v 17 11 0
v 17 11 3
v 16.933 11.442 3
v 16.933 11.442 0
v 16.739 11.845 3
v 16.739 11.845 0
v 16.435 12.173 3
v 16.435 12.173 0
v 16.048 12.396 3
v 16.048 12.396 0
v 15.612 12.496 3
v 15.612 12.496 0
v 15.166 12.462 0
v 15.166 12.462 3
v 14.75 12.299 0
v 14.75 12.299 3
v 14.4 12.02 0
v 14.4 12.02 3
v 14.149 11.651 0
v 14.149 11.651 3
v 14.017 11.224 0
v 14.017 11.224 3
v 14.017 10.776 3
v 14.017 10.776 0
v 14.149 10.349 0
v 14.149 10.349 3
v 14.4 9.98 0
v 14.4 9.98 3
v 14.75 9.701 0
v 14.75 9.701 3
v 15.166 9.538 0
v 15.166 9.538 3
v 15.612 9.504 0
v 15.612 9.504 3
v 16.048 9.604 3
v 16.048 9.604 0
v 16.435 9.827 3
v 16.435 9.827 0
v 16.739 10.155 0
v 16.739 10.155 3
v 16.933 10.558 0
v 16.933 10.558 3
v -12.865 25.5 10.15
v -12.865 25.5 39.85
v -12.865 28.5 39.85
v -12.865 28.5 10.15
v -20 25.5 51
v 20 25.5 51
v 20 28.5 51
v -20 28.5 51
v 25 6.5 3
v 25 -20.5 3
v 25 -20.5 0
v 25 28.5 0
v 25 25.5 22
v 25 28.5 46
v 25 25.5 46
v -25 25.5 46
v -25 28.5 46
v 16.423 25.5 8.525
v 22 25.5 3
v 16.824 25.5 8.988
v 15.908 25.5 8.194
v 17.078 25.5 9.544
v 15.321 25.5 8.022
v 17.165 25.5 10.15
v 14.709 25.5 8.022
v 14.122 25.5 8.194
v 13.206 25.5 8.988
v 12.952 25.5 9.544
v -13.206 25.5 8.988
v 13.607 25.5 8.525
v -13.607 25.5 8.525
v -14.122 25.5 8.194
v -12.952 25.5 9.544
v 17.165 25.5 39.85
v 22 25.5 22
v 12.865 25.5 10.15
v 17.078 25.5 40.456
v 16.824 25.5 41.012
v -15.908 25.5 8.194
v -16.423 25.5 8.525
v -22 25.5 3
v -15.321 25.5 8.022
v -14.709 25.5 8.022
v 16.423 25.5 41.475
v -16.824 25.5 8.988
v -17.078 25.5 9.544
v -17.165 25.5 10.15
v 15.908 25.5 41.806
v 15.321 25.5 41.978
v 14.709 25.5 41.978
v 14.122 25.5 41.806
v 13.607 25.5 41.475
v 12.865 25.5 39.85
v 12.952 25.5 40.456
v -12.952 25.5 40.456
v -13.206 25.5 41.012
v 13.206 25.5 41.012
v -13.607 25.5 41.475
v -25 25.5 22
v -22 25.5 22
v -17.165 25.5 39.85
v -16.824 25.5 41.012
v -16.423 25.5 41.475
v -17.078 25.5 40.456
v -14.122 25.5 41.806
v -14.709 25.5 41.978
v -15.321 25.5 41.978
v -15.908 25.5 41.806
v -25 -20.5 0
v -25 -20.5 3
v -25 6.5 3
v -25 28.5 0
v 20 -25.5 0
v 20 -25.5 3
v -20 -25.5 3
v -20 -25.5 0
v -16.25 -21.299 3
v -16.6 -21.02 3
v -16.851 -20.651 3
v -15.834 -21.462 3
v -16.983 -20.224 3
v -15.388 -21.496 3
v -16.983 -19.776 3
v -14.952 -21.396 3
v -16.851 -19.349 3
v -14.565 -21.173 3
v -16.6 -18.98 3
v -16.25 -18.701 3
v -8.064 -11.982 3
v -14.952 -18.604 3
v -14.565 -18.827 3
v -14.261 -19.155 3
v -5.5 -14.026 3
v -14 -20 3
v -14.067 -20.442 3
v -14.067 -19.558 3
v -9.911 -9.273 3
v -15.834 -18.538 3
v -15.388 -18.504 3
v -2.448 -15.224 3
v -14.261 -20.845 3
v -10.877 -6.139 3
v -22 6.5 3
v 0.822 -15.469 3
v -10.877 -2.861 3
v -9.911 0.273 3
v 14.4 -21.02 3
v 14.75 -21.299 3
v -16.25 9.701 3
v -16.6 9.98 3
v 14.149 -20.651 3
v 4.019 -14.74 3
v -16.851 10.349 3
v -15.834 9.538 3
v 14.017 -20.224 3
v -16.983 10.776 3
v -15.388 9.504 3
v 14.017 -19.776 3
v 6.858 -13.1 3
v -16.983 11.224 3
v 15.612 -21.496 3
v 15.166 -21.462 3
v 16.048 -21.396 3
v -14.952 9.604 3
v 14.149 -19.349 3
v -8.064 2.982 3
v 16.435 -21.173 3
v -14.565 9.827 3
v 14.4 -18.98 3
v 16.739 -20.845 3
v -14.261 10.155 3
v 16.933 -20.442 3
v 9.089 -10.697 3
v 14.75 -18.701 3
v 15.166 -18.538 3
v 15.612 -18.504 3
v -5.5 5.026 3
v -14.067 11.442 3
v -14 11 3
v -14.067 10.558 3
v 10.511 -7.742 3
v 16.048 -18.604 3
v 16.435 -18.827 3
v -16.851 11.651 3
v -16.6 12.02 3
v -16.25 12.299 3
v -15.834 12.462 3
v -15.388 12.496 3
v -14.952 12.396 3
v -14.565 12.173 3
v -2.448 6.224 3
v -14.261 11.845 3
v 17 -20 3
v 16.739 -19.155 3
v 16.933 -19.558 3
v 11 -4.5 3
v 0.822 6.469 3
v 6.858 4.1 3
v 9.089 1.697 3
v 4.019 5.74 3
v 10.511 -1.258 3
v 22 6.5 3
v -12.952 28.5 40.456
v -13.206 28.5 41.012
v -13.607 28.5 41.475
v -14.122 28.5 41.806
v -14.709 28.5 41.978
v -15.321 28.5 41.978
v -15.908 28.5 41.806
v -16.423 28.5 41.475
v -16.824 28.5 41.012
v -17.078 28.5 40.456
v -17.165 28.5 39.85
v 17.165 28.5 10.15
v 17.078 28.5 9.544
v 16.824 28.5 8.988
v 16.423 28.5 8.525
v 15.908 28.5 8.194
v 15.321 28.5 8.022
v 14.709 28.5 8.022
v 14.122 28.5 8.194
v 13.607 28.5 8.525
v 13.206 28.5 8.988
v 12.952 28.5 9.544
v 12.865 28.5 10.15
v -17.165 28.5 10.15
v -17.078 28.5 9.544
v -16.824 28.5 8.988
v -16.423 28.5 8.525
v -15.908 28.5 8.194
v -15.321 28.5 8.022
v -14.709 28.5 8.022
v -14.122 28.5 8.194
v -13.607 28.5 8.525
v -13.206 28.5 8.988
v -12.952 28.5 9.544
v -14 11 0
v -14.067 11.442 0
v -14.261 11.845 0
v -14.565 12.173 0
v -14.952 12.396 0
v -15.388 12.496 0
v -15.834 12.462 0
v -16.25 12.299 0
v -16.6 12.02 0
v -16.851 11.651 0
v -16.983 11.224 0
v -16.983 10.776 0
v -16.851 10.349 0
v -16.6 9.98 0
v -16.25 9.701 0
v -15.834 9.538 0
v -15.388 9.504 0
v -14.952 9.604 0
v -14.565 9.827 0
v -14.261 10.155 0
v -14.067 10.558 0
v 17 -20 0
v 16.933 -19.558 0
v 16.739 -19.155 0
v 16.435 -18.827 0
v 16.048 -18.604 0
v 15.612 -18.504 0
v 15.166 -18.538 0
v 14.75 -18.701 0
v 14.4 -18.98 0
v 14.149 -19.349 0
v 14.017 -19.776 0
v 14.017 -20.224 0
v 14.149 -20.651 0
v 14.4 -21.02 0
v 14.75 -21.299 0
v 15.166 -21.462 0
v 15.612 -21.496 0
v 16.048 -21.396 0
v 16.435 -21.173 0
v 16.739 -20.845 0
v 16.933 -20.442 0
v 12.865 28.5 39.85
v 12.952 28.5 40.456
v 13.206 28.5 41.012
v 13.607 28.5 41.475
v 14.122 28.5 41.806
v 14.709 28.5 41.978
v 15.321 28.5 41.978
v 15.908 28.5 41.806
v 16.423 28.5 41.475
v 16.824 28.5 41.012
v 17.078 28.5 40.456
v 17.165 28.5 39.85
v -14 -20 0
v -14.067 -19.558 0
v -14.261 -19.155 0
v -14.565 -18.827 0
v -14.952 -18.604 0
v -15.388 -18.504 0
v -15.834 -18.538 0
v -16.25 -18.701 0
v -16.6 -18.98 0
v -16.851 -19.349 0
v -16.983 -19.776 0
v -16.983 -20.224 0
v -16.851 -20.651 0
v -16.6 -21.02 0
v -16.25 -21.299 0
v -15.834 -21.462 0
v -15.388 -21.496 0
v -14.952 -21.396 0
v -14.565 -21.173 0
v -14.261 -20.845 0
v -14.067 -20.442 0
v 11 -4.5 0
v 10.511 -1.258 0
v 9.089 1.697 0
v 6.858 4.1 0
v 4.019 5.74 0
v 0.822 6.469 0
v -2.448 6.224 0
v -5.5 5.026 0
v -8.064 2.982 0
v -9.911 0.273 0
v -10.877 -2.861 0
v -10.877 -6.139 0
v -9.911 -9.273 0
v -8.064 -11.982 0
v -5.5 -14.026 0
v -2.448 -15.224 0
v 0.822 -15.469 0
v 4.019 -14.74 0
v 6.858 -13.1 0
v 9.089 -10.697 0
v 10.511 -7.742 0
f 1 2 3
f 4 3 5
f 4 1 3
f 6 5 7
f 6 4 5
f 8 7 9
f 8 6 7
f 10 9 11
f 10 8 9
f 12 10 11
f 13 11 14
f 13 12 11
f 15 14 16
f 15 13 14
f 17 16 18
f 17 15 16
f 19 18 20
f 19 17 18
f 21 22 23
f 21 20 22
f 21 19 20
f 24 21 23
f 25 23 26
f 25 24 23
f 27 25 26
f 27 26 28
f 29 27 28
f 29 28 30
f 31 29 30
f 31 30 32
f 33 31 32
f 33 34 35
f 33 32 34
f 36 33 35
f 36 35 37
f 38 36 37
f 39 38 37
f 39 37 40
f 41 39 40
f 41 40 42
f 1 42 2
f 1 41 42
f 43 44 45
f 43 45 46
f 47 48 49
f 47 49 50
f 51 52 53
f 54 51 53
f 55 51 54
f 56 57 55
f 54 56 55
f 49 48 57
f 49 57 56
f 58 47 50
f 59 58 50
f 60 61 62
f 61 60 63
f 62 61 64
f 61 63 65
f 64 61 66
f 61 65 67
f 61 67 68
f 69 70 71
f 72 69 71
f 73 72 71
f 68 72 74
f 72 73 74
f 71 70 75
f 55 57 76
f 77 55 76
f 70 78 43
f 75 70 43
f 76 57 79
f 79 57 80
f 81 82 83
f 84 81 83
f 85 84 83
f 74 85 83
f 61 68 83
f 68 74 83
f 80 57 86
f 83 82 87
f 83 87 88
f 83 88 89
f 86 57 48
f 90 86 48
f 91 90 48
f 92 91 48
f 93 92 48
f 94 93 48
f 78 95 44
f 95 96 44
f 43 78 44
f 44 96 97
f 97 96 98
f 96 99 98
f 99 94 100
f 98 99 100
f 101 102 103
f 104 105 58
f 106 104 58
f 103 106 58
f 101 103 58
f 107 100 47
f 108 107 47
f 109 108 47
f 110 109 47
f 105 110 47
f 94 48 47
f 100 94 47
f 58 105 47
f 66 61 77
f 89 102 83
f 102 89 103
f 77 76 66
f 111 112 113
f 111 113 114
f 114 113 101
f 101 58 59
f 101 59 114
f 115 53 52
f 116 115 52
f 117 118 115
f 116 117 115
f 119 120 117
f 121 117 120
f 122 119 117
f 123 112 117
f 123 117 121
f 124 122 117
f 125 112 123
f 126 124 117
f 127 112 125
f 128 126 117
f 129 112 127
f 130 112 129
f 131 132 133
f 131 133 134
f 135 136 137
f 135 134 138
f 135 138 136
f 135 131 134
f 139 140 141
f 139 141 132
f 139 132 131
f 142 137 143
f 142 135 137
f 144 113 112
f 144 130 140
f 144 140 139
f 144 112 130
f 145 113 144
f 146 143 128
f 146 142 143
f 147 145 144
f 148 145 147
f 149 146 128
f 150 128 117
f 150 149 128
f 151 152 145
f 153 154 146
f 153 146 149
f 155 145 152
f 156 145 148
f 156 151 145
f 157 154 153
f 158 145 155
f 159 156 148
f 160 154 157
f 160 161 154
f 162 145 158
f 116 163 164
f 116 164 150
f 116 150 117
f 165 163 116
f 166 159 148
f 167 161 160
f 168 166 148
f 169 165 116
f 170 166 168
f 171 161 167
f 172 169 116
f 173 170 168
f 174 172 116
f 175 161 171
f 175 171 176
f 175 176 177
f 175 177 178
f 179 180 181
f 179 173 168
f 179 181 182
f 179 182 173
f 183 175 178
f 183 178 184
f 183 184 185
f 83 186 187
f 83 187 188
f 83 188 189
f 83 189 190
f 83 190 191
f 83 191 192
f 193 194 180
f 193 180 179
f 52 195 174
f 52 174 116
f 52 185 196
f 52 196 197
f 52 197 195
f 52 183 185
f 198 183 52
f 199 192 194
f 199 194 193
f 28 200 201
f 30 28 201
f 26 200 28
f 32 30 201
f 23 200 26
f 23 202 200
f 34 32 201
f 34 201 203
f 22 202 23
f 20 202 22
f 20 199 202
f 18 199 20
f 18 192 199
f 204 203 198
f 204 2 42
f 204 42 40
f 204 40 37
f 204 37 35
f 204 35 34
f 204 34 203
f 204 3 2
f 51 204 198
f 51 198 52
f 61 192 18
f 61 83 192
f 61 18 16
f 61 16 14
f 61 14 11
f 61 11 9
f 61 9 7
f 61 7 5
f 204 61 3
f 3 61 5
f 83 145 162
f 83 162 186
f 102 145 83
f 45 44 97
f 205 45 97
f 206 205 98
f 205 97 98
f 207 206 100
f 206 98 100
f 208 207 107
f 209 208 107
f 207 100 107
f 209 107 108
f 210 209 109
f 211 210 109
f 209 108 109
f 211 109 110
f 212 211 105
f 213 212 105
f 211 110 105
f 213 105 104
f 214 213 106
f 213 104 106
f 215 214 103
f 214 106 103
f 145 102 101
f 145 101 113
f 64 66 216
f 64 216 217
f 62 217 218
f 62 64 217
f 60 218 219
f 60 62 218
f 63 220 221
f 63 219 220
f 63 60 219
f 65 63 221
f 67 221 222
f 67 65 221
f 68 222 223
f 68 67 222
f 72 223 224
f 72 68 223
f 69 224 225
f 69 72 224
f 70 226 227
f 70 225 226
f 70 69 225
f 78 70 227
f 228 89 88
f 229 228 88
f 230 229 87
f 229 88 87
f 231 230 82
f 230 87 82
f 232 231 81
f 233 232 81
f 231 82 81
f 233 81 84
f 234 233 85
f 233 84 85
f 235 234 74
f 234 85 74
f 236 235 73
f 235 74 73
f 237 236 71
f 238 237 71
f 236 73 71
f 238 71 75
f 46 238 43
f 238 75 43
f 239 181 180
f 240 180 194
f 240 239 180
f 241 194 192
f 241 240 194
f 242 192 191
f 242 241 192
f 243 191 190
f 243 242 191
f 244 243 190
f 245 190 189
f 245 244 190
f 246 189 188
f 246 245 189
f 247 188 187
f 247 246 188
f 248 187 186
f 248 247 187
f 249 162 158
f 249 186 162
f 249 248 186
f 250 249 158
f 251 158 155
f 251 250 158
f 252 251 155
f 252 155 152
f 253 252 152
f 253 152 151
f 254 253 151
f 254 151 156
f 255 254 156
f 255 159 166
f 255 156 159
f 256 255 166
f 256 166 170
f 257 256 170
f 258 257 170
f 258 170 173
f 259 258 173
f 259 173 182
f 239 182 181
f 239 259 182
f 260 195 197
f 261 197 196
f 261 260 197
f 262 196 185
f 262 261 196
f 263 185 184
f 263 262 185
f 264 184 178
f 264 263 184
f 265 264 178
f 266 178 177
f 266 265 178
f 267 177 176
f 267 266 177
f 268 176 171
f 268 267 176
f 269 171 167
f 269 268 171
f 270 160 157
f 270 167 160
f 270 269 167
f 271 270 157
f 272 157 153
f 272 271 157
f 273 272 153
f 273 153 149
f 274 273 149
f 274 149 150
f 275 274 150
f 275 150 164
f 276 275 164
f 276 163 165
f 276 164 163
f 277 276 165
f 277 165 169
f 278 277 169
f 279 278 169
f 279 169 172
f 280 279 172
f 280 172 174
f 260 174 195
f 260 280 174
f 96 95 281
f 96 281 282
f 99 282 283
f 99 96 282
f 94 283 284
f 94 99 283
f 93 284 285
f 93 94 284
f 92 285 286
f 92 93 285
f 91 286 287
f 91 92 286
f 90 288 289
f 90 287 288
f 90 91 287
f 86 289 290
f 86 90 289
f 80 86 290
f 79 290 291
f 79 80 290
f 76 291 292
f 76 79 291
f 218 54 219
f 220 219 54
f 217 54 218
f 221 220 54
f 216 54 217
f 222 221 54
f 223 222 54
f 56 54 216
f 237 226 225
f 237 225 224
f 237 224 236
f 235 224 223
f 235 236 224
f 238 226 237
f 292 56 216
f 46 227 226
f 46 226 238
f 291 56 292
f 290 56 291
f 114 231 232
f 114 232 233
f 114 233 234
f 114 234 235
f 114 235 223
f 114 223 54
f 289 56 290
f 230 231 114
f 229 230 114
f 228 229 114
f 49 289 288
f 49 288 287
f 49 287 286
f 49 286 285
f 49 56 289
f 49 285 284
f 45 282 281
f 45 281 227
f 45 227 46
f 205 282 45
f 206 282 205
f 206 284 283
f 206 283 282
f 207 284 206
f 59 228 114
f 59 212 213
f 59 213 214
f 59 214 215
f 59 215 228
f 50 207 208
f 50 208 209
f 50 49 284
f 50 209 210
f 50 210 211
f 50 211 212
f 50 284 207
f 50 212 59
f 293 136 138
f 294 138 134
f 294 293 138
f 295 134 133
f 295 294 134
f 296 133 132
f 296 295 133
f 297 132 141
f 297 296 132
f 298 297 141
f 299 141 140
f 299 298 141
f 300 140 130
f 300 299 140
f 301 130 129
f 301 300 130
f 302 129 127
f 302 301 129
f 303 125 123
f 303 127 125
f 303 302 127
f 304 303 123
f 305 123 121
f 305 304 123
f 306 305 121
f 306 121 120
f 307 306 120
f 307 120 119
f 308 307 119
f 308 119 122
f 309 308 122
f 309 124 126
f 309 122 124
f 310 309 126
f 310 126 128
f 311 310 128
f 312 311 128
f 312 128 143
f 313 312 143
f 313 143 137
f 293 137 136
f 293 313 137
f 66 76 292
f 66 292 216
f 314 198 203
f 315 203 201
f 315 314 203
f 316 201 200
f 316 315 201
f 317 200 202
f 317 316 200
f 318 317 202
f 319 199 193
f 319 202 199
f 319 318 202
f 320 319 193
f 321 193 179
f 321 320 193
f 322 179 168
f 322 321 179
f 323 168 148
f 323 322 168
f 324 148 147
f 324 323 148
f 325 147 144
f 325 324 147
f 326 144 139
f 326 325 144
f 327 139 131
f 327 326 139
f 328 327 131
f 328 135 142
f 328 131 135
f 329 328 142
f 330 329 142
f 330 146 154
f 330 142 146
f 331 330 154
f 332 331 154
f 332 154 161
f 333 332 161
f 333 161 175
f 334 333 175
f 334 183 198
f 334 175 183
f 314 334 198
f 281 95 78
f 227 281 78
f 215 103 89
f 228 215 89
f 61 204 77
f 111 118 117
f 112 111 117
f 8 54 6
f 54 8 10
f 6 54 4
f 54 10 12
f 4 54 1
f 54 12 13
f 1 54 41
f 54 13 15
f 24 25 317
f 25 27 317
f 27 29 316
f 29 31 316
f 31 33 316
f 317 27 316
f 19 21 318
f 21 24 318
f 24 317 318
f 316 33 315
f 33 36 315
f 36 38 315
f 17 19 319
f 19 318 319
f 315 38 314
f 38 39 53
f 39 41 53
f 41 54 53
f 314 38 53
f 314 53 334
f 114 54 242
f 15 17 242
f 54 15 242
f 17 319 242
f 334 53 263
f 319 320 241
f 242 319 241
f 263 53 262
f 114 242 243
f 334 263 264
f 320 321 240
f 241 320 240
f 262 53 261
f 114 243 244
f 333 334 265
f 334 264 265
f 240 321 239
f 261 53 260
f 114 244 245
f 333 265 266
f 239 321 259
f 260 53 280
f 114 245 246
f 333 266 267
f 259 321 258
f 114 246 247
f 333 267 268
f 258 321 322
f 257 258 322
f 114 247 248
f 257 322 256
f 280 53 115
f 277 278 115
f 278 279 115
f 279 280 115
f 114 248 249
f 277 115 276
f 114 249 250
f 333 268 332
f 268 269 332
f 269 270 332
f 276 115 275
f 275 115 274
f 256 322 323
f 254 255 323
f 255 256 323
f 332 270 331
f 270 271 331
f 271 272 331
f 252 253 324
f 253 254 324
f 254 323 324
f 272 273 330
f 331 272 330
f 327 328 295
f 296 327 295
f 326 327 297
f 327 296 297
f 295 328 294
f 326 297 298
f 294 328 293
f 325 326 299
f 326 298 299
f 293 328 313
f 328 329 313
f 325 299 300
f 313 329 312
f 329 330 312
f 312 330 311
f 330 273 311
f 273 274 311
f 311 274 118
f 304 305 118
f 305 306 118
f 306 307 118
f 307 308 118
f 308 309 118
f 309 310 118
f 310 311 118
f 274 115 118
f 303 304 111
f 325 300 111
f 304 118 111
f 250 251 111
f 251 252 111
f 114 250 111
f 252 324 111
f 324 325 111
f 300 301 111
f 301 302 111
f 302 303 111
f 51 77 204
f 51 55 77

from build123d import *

# Parameters (mm, degrees)
SKETCH_W             = 50
SKETCH_H             = 51
PAD_DEPTH            = 3
CHAMFER_SIZE         = 5
SKETCH001_W          = 50
SKETCH001_H          = 51
PAD001_DEPTH         = 3
CHAMFER001_SIZE      = 5
POCKET_DEPTH         = 207.576403
SKETCH003_R          = 1.5
SKETCH003_R_2        = 11
POCKET001_DEPTH      = 0.001
POCKET001_DEPTH_BACK = -51.001
PAD002_DEPTH         = 25
POCKET002_DEPTH      = 22


with BuildPart() as part:
    # Sketch → Pad (new body)
    with BuildSketch(Plane.XY):
        Rectangle(SKETCH_W, SKETCH_H)
    extrude(amount=PAD_DEPTH)

    # Chamfer
    chamfer_edges = [part.edges().sort_by_distance(p)[0] for p in [
        (25, -25.5, 1.5),
        (-25, -25.5, 1.5),
    ]]
    chamfer(chamfer_edges, length=CHAMFER_SIZE)

    # Sketch001 (on Face4 of Chamfer) → Pad001 (join)
    with BuildSketch(Plane(origin=(0, 25.5, 0), x_dir=(-1, 0, 0), z_dir=(0, 1, 0))):
        with Locations((0, 25.5)):
            Rectangle(SKETCH001_W, SKETCH001_H)
    extrude(amount=PAD001_DEPTH)

    # Chamfer001
    chamfer001_edges = [part.edges().sort_by_distance(p)[0] for p in [
        (-25, 27, 51),
        (25, 27, 51),
    ]]
    chamfer(chamfer001_edges, length=CHAMFER001_SIZE)

    # Sketch002 → Pocket (cut, through all)
    with BuildSketch(Plane.XZ):
        with BuildLine():
            ThreePointArc((-12.865, 39.85), (-15.015, 42), (-17.165, 39.85))
            Line((-17.165, 39.85), (-17.165, 10.15))
            ThreePointArc((-17.165, 10.15), (-15.015, 8), (-12.865, 10.15))
            Line((-12.865, 39.85), (-12.865, 10.15))
        make_face()
    pocket = extrude(amount=-POCKET_DEPTH, mode=Mode.SUBTRACT)

    # Mirrored: Pocket across Sketch002 V_Axis
    add(pocket.mirror(Plane(origin=(0, 0, 0), x_dir=(0, -1, 0), z_dir=(1, 0, 0))), mode=Mode.SUBTRACT)

    # Sketch003 → Pocket001 (cut, two sides)
    with BuildSketch(Plane.XY) as pocket001_sk:
        with Locations((-15.5, 11)):
            Circle(SKETCH003_R)
        with Locations((15.5, 11)):
            Circle(SKETCH003_R)
        with Locations((15.5, -20)):
            Circle(SKETCH003_R)
        with Locations((-15.5, -20)):
            Circle(SKETCH003_R)
        with Locations((0, -4.5)):
            Circle(SKETCH003_R_2)
    extrude(amount=-POCKET001_DEPTH, mode=Mode.SUBTRACT)
    extrude(pocket001_sk.sketch, amount=-POCKET001_DEPTH_BACK, mode=Mode.SUBTRACT)

    # Sketch004 → Pad002 (join, symmetric)
    with BuildSketch(Plane.YZ):
        Polygon((25.5, 22), (6.5, 3), (25.5, 3), align=None)
    extrude(amount=PAD002_DEPTH, both=True)

    # Sketch004 → Pocket002 (cut, symmetric)
    with BuildSketch(Plane.YZ):
        Polygon((25.5, 22), (6.5, 3), (25.5, 3), align=None)
    extrude(amount=POCKET002_DEPTH, both=True, mode=Mode.SUBTRACT)


solid = part.part
